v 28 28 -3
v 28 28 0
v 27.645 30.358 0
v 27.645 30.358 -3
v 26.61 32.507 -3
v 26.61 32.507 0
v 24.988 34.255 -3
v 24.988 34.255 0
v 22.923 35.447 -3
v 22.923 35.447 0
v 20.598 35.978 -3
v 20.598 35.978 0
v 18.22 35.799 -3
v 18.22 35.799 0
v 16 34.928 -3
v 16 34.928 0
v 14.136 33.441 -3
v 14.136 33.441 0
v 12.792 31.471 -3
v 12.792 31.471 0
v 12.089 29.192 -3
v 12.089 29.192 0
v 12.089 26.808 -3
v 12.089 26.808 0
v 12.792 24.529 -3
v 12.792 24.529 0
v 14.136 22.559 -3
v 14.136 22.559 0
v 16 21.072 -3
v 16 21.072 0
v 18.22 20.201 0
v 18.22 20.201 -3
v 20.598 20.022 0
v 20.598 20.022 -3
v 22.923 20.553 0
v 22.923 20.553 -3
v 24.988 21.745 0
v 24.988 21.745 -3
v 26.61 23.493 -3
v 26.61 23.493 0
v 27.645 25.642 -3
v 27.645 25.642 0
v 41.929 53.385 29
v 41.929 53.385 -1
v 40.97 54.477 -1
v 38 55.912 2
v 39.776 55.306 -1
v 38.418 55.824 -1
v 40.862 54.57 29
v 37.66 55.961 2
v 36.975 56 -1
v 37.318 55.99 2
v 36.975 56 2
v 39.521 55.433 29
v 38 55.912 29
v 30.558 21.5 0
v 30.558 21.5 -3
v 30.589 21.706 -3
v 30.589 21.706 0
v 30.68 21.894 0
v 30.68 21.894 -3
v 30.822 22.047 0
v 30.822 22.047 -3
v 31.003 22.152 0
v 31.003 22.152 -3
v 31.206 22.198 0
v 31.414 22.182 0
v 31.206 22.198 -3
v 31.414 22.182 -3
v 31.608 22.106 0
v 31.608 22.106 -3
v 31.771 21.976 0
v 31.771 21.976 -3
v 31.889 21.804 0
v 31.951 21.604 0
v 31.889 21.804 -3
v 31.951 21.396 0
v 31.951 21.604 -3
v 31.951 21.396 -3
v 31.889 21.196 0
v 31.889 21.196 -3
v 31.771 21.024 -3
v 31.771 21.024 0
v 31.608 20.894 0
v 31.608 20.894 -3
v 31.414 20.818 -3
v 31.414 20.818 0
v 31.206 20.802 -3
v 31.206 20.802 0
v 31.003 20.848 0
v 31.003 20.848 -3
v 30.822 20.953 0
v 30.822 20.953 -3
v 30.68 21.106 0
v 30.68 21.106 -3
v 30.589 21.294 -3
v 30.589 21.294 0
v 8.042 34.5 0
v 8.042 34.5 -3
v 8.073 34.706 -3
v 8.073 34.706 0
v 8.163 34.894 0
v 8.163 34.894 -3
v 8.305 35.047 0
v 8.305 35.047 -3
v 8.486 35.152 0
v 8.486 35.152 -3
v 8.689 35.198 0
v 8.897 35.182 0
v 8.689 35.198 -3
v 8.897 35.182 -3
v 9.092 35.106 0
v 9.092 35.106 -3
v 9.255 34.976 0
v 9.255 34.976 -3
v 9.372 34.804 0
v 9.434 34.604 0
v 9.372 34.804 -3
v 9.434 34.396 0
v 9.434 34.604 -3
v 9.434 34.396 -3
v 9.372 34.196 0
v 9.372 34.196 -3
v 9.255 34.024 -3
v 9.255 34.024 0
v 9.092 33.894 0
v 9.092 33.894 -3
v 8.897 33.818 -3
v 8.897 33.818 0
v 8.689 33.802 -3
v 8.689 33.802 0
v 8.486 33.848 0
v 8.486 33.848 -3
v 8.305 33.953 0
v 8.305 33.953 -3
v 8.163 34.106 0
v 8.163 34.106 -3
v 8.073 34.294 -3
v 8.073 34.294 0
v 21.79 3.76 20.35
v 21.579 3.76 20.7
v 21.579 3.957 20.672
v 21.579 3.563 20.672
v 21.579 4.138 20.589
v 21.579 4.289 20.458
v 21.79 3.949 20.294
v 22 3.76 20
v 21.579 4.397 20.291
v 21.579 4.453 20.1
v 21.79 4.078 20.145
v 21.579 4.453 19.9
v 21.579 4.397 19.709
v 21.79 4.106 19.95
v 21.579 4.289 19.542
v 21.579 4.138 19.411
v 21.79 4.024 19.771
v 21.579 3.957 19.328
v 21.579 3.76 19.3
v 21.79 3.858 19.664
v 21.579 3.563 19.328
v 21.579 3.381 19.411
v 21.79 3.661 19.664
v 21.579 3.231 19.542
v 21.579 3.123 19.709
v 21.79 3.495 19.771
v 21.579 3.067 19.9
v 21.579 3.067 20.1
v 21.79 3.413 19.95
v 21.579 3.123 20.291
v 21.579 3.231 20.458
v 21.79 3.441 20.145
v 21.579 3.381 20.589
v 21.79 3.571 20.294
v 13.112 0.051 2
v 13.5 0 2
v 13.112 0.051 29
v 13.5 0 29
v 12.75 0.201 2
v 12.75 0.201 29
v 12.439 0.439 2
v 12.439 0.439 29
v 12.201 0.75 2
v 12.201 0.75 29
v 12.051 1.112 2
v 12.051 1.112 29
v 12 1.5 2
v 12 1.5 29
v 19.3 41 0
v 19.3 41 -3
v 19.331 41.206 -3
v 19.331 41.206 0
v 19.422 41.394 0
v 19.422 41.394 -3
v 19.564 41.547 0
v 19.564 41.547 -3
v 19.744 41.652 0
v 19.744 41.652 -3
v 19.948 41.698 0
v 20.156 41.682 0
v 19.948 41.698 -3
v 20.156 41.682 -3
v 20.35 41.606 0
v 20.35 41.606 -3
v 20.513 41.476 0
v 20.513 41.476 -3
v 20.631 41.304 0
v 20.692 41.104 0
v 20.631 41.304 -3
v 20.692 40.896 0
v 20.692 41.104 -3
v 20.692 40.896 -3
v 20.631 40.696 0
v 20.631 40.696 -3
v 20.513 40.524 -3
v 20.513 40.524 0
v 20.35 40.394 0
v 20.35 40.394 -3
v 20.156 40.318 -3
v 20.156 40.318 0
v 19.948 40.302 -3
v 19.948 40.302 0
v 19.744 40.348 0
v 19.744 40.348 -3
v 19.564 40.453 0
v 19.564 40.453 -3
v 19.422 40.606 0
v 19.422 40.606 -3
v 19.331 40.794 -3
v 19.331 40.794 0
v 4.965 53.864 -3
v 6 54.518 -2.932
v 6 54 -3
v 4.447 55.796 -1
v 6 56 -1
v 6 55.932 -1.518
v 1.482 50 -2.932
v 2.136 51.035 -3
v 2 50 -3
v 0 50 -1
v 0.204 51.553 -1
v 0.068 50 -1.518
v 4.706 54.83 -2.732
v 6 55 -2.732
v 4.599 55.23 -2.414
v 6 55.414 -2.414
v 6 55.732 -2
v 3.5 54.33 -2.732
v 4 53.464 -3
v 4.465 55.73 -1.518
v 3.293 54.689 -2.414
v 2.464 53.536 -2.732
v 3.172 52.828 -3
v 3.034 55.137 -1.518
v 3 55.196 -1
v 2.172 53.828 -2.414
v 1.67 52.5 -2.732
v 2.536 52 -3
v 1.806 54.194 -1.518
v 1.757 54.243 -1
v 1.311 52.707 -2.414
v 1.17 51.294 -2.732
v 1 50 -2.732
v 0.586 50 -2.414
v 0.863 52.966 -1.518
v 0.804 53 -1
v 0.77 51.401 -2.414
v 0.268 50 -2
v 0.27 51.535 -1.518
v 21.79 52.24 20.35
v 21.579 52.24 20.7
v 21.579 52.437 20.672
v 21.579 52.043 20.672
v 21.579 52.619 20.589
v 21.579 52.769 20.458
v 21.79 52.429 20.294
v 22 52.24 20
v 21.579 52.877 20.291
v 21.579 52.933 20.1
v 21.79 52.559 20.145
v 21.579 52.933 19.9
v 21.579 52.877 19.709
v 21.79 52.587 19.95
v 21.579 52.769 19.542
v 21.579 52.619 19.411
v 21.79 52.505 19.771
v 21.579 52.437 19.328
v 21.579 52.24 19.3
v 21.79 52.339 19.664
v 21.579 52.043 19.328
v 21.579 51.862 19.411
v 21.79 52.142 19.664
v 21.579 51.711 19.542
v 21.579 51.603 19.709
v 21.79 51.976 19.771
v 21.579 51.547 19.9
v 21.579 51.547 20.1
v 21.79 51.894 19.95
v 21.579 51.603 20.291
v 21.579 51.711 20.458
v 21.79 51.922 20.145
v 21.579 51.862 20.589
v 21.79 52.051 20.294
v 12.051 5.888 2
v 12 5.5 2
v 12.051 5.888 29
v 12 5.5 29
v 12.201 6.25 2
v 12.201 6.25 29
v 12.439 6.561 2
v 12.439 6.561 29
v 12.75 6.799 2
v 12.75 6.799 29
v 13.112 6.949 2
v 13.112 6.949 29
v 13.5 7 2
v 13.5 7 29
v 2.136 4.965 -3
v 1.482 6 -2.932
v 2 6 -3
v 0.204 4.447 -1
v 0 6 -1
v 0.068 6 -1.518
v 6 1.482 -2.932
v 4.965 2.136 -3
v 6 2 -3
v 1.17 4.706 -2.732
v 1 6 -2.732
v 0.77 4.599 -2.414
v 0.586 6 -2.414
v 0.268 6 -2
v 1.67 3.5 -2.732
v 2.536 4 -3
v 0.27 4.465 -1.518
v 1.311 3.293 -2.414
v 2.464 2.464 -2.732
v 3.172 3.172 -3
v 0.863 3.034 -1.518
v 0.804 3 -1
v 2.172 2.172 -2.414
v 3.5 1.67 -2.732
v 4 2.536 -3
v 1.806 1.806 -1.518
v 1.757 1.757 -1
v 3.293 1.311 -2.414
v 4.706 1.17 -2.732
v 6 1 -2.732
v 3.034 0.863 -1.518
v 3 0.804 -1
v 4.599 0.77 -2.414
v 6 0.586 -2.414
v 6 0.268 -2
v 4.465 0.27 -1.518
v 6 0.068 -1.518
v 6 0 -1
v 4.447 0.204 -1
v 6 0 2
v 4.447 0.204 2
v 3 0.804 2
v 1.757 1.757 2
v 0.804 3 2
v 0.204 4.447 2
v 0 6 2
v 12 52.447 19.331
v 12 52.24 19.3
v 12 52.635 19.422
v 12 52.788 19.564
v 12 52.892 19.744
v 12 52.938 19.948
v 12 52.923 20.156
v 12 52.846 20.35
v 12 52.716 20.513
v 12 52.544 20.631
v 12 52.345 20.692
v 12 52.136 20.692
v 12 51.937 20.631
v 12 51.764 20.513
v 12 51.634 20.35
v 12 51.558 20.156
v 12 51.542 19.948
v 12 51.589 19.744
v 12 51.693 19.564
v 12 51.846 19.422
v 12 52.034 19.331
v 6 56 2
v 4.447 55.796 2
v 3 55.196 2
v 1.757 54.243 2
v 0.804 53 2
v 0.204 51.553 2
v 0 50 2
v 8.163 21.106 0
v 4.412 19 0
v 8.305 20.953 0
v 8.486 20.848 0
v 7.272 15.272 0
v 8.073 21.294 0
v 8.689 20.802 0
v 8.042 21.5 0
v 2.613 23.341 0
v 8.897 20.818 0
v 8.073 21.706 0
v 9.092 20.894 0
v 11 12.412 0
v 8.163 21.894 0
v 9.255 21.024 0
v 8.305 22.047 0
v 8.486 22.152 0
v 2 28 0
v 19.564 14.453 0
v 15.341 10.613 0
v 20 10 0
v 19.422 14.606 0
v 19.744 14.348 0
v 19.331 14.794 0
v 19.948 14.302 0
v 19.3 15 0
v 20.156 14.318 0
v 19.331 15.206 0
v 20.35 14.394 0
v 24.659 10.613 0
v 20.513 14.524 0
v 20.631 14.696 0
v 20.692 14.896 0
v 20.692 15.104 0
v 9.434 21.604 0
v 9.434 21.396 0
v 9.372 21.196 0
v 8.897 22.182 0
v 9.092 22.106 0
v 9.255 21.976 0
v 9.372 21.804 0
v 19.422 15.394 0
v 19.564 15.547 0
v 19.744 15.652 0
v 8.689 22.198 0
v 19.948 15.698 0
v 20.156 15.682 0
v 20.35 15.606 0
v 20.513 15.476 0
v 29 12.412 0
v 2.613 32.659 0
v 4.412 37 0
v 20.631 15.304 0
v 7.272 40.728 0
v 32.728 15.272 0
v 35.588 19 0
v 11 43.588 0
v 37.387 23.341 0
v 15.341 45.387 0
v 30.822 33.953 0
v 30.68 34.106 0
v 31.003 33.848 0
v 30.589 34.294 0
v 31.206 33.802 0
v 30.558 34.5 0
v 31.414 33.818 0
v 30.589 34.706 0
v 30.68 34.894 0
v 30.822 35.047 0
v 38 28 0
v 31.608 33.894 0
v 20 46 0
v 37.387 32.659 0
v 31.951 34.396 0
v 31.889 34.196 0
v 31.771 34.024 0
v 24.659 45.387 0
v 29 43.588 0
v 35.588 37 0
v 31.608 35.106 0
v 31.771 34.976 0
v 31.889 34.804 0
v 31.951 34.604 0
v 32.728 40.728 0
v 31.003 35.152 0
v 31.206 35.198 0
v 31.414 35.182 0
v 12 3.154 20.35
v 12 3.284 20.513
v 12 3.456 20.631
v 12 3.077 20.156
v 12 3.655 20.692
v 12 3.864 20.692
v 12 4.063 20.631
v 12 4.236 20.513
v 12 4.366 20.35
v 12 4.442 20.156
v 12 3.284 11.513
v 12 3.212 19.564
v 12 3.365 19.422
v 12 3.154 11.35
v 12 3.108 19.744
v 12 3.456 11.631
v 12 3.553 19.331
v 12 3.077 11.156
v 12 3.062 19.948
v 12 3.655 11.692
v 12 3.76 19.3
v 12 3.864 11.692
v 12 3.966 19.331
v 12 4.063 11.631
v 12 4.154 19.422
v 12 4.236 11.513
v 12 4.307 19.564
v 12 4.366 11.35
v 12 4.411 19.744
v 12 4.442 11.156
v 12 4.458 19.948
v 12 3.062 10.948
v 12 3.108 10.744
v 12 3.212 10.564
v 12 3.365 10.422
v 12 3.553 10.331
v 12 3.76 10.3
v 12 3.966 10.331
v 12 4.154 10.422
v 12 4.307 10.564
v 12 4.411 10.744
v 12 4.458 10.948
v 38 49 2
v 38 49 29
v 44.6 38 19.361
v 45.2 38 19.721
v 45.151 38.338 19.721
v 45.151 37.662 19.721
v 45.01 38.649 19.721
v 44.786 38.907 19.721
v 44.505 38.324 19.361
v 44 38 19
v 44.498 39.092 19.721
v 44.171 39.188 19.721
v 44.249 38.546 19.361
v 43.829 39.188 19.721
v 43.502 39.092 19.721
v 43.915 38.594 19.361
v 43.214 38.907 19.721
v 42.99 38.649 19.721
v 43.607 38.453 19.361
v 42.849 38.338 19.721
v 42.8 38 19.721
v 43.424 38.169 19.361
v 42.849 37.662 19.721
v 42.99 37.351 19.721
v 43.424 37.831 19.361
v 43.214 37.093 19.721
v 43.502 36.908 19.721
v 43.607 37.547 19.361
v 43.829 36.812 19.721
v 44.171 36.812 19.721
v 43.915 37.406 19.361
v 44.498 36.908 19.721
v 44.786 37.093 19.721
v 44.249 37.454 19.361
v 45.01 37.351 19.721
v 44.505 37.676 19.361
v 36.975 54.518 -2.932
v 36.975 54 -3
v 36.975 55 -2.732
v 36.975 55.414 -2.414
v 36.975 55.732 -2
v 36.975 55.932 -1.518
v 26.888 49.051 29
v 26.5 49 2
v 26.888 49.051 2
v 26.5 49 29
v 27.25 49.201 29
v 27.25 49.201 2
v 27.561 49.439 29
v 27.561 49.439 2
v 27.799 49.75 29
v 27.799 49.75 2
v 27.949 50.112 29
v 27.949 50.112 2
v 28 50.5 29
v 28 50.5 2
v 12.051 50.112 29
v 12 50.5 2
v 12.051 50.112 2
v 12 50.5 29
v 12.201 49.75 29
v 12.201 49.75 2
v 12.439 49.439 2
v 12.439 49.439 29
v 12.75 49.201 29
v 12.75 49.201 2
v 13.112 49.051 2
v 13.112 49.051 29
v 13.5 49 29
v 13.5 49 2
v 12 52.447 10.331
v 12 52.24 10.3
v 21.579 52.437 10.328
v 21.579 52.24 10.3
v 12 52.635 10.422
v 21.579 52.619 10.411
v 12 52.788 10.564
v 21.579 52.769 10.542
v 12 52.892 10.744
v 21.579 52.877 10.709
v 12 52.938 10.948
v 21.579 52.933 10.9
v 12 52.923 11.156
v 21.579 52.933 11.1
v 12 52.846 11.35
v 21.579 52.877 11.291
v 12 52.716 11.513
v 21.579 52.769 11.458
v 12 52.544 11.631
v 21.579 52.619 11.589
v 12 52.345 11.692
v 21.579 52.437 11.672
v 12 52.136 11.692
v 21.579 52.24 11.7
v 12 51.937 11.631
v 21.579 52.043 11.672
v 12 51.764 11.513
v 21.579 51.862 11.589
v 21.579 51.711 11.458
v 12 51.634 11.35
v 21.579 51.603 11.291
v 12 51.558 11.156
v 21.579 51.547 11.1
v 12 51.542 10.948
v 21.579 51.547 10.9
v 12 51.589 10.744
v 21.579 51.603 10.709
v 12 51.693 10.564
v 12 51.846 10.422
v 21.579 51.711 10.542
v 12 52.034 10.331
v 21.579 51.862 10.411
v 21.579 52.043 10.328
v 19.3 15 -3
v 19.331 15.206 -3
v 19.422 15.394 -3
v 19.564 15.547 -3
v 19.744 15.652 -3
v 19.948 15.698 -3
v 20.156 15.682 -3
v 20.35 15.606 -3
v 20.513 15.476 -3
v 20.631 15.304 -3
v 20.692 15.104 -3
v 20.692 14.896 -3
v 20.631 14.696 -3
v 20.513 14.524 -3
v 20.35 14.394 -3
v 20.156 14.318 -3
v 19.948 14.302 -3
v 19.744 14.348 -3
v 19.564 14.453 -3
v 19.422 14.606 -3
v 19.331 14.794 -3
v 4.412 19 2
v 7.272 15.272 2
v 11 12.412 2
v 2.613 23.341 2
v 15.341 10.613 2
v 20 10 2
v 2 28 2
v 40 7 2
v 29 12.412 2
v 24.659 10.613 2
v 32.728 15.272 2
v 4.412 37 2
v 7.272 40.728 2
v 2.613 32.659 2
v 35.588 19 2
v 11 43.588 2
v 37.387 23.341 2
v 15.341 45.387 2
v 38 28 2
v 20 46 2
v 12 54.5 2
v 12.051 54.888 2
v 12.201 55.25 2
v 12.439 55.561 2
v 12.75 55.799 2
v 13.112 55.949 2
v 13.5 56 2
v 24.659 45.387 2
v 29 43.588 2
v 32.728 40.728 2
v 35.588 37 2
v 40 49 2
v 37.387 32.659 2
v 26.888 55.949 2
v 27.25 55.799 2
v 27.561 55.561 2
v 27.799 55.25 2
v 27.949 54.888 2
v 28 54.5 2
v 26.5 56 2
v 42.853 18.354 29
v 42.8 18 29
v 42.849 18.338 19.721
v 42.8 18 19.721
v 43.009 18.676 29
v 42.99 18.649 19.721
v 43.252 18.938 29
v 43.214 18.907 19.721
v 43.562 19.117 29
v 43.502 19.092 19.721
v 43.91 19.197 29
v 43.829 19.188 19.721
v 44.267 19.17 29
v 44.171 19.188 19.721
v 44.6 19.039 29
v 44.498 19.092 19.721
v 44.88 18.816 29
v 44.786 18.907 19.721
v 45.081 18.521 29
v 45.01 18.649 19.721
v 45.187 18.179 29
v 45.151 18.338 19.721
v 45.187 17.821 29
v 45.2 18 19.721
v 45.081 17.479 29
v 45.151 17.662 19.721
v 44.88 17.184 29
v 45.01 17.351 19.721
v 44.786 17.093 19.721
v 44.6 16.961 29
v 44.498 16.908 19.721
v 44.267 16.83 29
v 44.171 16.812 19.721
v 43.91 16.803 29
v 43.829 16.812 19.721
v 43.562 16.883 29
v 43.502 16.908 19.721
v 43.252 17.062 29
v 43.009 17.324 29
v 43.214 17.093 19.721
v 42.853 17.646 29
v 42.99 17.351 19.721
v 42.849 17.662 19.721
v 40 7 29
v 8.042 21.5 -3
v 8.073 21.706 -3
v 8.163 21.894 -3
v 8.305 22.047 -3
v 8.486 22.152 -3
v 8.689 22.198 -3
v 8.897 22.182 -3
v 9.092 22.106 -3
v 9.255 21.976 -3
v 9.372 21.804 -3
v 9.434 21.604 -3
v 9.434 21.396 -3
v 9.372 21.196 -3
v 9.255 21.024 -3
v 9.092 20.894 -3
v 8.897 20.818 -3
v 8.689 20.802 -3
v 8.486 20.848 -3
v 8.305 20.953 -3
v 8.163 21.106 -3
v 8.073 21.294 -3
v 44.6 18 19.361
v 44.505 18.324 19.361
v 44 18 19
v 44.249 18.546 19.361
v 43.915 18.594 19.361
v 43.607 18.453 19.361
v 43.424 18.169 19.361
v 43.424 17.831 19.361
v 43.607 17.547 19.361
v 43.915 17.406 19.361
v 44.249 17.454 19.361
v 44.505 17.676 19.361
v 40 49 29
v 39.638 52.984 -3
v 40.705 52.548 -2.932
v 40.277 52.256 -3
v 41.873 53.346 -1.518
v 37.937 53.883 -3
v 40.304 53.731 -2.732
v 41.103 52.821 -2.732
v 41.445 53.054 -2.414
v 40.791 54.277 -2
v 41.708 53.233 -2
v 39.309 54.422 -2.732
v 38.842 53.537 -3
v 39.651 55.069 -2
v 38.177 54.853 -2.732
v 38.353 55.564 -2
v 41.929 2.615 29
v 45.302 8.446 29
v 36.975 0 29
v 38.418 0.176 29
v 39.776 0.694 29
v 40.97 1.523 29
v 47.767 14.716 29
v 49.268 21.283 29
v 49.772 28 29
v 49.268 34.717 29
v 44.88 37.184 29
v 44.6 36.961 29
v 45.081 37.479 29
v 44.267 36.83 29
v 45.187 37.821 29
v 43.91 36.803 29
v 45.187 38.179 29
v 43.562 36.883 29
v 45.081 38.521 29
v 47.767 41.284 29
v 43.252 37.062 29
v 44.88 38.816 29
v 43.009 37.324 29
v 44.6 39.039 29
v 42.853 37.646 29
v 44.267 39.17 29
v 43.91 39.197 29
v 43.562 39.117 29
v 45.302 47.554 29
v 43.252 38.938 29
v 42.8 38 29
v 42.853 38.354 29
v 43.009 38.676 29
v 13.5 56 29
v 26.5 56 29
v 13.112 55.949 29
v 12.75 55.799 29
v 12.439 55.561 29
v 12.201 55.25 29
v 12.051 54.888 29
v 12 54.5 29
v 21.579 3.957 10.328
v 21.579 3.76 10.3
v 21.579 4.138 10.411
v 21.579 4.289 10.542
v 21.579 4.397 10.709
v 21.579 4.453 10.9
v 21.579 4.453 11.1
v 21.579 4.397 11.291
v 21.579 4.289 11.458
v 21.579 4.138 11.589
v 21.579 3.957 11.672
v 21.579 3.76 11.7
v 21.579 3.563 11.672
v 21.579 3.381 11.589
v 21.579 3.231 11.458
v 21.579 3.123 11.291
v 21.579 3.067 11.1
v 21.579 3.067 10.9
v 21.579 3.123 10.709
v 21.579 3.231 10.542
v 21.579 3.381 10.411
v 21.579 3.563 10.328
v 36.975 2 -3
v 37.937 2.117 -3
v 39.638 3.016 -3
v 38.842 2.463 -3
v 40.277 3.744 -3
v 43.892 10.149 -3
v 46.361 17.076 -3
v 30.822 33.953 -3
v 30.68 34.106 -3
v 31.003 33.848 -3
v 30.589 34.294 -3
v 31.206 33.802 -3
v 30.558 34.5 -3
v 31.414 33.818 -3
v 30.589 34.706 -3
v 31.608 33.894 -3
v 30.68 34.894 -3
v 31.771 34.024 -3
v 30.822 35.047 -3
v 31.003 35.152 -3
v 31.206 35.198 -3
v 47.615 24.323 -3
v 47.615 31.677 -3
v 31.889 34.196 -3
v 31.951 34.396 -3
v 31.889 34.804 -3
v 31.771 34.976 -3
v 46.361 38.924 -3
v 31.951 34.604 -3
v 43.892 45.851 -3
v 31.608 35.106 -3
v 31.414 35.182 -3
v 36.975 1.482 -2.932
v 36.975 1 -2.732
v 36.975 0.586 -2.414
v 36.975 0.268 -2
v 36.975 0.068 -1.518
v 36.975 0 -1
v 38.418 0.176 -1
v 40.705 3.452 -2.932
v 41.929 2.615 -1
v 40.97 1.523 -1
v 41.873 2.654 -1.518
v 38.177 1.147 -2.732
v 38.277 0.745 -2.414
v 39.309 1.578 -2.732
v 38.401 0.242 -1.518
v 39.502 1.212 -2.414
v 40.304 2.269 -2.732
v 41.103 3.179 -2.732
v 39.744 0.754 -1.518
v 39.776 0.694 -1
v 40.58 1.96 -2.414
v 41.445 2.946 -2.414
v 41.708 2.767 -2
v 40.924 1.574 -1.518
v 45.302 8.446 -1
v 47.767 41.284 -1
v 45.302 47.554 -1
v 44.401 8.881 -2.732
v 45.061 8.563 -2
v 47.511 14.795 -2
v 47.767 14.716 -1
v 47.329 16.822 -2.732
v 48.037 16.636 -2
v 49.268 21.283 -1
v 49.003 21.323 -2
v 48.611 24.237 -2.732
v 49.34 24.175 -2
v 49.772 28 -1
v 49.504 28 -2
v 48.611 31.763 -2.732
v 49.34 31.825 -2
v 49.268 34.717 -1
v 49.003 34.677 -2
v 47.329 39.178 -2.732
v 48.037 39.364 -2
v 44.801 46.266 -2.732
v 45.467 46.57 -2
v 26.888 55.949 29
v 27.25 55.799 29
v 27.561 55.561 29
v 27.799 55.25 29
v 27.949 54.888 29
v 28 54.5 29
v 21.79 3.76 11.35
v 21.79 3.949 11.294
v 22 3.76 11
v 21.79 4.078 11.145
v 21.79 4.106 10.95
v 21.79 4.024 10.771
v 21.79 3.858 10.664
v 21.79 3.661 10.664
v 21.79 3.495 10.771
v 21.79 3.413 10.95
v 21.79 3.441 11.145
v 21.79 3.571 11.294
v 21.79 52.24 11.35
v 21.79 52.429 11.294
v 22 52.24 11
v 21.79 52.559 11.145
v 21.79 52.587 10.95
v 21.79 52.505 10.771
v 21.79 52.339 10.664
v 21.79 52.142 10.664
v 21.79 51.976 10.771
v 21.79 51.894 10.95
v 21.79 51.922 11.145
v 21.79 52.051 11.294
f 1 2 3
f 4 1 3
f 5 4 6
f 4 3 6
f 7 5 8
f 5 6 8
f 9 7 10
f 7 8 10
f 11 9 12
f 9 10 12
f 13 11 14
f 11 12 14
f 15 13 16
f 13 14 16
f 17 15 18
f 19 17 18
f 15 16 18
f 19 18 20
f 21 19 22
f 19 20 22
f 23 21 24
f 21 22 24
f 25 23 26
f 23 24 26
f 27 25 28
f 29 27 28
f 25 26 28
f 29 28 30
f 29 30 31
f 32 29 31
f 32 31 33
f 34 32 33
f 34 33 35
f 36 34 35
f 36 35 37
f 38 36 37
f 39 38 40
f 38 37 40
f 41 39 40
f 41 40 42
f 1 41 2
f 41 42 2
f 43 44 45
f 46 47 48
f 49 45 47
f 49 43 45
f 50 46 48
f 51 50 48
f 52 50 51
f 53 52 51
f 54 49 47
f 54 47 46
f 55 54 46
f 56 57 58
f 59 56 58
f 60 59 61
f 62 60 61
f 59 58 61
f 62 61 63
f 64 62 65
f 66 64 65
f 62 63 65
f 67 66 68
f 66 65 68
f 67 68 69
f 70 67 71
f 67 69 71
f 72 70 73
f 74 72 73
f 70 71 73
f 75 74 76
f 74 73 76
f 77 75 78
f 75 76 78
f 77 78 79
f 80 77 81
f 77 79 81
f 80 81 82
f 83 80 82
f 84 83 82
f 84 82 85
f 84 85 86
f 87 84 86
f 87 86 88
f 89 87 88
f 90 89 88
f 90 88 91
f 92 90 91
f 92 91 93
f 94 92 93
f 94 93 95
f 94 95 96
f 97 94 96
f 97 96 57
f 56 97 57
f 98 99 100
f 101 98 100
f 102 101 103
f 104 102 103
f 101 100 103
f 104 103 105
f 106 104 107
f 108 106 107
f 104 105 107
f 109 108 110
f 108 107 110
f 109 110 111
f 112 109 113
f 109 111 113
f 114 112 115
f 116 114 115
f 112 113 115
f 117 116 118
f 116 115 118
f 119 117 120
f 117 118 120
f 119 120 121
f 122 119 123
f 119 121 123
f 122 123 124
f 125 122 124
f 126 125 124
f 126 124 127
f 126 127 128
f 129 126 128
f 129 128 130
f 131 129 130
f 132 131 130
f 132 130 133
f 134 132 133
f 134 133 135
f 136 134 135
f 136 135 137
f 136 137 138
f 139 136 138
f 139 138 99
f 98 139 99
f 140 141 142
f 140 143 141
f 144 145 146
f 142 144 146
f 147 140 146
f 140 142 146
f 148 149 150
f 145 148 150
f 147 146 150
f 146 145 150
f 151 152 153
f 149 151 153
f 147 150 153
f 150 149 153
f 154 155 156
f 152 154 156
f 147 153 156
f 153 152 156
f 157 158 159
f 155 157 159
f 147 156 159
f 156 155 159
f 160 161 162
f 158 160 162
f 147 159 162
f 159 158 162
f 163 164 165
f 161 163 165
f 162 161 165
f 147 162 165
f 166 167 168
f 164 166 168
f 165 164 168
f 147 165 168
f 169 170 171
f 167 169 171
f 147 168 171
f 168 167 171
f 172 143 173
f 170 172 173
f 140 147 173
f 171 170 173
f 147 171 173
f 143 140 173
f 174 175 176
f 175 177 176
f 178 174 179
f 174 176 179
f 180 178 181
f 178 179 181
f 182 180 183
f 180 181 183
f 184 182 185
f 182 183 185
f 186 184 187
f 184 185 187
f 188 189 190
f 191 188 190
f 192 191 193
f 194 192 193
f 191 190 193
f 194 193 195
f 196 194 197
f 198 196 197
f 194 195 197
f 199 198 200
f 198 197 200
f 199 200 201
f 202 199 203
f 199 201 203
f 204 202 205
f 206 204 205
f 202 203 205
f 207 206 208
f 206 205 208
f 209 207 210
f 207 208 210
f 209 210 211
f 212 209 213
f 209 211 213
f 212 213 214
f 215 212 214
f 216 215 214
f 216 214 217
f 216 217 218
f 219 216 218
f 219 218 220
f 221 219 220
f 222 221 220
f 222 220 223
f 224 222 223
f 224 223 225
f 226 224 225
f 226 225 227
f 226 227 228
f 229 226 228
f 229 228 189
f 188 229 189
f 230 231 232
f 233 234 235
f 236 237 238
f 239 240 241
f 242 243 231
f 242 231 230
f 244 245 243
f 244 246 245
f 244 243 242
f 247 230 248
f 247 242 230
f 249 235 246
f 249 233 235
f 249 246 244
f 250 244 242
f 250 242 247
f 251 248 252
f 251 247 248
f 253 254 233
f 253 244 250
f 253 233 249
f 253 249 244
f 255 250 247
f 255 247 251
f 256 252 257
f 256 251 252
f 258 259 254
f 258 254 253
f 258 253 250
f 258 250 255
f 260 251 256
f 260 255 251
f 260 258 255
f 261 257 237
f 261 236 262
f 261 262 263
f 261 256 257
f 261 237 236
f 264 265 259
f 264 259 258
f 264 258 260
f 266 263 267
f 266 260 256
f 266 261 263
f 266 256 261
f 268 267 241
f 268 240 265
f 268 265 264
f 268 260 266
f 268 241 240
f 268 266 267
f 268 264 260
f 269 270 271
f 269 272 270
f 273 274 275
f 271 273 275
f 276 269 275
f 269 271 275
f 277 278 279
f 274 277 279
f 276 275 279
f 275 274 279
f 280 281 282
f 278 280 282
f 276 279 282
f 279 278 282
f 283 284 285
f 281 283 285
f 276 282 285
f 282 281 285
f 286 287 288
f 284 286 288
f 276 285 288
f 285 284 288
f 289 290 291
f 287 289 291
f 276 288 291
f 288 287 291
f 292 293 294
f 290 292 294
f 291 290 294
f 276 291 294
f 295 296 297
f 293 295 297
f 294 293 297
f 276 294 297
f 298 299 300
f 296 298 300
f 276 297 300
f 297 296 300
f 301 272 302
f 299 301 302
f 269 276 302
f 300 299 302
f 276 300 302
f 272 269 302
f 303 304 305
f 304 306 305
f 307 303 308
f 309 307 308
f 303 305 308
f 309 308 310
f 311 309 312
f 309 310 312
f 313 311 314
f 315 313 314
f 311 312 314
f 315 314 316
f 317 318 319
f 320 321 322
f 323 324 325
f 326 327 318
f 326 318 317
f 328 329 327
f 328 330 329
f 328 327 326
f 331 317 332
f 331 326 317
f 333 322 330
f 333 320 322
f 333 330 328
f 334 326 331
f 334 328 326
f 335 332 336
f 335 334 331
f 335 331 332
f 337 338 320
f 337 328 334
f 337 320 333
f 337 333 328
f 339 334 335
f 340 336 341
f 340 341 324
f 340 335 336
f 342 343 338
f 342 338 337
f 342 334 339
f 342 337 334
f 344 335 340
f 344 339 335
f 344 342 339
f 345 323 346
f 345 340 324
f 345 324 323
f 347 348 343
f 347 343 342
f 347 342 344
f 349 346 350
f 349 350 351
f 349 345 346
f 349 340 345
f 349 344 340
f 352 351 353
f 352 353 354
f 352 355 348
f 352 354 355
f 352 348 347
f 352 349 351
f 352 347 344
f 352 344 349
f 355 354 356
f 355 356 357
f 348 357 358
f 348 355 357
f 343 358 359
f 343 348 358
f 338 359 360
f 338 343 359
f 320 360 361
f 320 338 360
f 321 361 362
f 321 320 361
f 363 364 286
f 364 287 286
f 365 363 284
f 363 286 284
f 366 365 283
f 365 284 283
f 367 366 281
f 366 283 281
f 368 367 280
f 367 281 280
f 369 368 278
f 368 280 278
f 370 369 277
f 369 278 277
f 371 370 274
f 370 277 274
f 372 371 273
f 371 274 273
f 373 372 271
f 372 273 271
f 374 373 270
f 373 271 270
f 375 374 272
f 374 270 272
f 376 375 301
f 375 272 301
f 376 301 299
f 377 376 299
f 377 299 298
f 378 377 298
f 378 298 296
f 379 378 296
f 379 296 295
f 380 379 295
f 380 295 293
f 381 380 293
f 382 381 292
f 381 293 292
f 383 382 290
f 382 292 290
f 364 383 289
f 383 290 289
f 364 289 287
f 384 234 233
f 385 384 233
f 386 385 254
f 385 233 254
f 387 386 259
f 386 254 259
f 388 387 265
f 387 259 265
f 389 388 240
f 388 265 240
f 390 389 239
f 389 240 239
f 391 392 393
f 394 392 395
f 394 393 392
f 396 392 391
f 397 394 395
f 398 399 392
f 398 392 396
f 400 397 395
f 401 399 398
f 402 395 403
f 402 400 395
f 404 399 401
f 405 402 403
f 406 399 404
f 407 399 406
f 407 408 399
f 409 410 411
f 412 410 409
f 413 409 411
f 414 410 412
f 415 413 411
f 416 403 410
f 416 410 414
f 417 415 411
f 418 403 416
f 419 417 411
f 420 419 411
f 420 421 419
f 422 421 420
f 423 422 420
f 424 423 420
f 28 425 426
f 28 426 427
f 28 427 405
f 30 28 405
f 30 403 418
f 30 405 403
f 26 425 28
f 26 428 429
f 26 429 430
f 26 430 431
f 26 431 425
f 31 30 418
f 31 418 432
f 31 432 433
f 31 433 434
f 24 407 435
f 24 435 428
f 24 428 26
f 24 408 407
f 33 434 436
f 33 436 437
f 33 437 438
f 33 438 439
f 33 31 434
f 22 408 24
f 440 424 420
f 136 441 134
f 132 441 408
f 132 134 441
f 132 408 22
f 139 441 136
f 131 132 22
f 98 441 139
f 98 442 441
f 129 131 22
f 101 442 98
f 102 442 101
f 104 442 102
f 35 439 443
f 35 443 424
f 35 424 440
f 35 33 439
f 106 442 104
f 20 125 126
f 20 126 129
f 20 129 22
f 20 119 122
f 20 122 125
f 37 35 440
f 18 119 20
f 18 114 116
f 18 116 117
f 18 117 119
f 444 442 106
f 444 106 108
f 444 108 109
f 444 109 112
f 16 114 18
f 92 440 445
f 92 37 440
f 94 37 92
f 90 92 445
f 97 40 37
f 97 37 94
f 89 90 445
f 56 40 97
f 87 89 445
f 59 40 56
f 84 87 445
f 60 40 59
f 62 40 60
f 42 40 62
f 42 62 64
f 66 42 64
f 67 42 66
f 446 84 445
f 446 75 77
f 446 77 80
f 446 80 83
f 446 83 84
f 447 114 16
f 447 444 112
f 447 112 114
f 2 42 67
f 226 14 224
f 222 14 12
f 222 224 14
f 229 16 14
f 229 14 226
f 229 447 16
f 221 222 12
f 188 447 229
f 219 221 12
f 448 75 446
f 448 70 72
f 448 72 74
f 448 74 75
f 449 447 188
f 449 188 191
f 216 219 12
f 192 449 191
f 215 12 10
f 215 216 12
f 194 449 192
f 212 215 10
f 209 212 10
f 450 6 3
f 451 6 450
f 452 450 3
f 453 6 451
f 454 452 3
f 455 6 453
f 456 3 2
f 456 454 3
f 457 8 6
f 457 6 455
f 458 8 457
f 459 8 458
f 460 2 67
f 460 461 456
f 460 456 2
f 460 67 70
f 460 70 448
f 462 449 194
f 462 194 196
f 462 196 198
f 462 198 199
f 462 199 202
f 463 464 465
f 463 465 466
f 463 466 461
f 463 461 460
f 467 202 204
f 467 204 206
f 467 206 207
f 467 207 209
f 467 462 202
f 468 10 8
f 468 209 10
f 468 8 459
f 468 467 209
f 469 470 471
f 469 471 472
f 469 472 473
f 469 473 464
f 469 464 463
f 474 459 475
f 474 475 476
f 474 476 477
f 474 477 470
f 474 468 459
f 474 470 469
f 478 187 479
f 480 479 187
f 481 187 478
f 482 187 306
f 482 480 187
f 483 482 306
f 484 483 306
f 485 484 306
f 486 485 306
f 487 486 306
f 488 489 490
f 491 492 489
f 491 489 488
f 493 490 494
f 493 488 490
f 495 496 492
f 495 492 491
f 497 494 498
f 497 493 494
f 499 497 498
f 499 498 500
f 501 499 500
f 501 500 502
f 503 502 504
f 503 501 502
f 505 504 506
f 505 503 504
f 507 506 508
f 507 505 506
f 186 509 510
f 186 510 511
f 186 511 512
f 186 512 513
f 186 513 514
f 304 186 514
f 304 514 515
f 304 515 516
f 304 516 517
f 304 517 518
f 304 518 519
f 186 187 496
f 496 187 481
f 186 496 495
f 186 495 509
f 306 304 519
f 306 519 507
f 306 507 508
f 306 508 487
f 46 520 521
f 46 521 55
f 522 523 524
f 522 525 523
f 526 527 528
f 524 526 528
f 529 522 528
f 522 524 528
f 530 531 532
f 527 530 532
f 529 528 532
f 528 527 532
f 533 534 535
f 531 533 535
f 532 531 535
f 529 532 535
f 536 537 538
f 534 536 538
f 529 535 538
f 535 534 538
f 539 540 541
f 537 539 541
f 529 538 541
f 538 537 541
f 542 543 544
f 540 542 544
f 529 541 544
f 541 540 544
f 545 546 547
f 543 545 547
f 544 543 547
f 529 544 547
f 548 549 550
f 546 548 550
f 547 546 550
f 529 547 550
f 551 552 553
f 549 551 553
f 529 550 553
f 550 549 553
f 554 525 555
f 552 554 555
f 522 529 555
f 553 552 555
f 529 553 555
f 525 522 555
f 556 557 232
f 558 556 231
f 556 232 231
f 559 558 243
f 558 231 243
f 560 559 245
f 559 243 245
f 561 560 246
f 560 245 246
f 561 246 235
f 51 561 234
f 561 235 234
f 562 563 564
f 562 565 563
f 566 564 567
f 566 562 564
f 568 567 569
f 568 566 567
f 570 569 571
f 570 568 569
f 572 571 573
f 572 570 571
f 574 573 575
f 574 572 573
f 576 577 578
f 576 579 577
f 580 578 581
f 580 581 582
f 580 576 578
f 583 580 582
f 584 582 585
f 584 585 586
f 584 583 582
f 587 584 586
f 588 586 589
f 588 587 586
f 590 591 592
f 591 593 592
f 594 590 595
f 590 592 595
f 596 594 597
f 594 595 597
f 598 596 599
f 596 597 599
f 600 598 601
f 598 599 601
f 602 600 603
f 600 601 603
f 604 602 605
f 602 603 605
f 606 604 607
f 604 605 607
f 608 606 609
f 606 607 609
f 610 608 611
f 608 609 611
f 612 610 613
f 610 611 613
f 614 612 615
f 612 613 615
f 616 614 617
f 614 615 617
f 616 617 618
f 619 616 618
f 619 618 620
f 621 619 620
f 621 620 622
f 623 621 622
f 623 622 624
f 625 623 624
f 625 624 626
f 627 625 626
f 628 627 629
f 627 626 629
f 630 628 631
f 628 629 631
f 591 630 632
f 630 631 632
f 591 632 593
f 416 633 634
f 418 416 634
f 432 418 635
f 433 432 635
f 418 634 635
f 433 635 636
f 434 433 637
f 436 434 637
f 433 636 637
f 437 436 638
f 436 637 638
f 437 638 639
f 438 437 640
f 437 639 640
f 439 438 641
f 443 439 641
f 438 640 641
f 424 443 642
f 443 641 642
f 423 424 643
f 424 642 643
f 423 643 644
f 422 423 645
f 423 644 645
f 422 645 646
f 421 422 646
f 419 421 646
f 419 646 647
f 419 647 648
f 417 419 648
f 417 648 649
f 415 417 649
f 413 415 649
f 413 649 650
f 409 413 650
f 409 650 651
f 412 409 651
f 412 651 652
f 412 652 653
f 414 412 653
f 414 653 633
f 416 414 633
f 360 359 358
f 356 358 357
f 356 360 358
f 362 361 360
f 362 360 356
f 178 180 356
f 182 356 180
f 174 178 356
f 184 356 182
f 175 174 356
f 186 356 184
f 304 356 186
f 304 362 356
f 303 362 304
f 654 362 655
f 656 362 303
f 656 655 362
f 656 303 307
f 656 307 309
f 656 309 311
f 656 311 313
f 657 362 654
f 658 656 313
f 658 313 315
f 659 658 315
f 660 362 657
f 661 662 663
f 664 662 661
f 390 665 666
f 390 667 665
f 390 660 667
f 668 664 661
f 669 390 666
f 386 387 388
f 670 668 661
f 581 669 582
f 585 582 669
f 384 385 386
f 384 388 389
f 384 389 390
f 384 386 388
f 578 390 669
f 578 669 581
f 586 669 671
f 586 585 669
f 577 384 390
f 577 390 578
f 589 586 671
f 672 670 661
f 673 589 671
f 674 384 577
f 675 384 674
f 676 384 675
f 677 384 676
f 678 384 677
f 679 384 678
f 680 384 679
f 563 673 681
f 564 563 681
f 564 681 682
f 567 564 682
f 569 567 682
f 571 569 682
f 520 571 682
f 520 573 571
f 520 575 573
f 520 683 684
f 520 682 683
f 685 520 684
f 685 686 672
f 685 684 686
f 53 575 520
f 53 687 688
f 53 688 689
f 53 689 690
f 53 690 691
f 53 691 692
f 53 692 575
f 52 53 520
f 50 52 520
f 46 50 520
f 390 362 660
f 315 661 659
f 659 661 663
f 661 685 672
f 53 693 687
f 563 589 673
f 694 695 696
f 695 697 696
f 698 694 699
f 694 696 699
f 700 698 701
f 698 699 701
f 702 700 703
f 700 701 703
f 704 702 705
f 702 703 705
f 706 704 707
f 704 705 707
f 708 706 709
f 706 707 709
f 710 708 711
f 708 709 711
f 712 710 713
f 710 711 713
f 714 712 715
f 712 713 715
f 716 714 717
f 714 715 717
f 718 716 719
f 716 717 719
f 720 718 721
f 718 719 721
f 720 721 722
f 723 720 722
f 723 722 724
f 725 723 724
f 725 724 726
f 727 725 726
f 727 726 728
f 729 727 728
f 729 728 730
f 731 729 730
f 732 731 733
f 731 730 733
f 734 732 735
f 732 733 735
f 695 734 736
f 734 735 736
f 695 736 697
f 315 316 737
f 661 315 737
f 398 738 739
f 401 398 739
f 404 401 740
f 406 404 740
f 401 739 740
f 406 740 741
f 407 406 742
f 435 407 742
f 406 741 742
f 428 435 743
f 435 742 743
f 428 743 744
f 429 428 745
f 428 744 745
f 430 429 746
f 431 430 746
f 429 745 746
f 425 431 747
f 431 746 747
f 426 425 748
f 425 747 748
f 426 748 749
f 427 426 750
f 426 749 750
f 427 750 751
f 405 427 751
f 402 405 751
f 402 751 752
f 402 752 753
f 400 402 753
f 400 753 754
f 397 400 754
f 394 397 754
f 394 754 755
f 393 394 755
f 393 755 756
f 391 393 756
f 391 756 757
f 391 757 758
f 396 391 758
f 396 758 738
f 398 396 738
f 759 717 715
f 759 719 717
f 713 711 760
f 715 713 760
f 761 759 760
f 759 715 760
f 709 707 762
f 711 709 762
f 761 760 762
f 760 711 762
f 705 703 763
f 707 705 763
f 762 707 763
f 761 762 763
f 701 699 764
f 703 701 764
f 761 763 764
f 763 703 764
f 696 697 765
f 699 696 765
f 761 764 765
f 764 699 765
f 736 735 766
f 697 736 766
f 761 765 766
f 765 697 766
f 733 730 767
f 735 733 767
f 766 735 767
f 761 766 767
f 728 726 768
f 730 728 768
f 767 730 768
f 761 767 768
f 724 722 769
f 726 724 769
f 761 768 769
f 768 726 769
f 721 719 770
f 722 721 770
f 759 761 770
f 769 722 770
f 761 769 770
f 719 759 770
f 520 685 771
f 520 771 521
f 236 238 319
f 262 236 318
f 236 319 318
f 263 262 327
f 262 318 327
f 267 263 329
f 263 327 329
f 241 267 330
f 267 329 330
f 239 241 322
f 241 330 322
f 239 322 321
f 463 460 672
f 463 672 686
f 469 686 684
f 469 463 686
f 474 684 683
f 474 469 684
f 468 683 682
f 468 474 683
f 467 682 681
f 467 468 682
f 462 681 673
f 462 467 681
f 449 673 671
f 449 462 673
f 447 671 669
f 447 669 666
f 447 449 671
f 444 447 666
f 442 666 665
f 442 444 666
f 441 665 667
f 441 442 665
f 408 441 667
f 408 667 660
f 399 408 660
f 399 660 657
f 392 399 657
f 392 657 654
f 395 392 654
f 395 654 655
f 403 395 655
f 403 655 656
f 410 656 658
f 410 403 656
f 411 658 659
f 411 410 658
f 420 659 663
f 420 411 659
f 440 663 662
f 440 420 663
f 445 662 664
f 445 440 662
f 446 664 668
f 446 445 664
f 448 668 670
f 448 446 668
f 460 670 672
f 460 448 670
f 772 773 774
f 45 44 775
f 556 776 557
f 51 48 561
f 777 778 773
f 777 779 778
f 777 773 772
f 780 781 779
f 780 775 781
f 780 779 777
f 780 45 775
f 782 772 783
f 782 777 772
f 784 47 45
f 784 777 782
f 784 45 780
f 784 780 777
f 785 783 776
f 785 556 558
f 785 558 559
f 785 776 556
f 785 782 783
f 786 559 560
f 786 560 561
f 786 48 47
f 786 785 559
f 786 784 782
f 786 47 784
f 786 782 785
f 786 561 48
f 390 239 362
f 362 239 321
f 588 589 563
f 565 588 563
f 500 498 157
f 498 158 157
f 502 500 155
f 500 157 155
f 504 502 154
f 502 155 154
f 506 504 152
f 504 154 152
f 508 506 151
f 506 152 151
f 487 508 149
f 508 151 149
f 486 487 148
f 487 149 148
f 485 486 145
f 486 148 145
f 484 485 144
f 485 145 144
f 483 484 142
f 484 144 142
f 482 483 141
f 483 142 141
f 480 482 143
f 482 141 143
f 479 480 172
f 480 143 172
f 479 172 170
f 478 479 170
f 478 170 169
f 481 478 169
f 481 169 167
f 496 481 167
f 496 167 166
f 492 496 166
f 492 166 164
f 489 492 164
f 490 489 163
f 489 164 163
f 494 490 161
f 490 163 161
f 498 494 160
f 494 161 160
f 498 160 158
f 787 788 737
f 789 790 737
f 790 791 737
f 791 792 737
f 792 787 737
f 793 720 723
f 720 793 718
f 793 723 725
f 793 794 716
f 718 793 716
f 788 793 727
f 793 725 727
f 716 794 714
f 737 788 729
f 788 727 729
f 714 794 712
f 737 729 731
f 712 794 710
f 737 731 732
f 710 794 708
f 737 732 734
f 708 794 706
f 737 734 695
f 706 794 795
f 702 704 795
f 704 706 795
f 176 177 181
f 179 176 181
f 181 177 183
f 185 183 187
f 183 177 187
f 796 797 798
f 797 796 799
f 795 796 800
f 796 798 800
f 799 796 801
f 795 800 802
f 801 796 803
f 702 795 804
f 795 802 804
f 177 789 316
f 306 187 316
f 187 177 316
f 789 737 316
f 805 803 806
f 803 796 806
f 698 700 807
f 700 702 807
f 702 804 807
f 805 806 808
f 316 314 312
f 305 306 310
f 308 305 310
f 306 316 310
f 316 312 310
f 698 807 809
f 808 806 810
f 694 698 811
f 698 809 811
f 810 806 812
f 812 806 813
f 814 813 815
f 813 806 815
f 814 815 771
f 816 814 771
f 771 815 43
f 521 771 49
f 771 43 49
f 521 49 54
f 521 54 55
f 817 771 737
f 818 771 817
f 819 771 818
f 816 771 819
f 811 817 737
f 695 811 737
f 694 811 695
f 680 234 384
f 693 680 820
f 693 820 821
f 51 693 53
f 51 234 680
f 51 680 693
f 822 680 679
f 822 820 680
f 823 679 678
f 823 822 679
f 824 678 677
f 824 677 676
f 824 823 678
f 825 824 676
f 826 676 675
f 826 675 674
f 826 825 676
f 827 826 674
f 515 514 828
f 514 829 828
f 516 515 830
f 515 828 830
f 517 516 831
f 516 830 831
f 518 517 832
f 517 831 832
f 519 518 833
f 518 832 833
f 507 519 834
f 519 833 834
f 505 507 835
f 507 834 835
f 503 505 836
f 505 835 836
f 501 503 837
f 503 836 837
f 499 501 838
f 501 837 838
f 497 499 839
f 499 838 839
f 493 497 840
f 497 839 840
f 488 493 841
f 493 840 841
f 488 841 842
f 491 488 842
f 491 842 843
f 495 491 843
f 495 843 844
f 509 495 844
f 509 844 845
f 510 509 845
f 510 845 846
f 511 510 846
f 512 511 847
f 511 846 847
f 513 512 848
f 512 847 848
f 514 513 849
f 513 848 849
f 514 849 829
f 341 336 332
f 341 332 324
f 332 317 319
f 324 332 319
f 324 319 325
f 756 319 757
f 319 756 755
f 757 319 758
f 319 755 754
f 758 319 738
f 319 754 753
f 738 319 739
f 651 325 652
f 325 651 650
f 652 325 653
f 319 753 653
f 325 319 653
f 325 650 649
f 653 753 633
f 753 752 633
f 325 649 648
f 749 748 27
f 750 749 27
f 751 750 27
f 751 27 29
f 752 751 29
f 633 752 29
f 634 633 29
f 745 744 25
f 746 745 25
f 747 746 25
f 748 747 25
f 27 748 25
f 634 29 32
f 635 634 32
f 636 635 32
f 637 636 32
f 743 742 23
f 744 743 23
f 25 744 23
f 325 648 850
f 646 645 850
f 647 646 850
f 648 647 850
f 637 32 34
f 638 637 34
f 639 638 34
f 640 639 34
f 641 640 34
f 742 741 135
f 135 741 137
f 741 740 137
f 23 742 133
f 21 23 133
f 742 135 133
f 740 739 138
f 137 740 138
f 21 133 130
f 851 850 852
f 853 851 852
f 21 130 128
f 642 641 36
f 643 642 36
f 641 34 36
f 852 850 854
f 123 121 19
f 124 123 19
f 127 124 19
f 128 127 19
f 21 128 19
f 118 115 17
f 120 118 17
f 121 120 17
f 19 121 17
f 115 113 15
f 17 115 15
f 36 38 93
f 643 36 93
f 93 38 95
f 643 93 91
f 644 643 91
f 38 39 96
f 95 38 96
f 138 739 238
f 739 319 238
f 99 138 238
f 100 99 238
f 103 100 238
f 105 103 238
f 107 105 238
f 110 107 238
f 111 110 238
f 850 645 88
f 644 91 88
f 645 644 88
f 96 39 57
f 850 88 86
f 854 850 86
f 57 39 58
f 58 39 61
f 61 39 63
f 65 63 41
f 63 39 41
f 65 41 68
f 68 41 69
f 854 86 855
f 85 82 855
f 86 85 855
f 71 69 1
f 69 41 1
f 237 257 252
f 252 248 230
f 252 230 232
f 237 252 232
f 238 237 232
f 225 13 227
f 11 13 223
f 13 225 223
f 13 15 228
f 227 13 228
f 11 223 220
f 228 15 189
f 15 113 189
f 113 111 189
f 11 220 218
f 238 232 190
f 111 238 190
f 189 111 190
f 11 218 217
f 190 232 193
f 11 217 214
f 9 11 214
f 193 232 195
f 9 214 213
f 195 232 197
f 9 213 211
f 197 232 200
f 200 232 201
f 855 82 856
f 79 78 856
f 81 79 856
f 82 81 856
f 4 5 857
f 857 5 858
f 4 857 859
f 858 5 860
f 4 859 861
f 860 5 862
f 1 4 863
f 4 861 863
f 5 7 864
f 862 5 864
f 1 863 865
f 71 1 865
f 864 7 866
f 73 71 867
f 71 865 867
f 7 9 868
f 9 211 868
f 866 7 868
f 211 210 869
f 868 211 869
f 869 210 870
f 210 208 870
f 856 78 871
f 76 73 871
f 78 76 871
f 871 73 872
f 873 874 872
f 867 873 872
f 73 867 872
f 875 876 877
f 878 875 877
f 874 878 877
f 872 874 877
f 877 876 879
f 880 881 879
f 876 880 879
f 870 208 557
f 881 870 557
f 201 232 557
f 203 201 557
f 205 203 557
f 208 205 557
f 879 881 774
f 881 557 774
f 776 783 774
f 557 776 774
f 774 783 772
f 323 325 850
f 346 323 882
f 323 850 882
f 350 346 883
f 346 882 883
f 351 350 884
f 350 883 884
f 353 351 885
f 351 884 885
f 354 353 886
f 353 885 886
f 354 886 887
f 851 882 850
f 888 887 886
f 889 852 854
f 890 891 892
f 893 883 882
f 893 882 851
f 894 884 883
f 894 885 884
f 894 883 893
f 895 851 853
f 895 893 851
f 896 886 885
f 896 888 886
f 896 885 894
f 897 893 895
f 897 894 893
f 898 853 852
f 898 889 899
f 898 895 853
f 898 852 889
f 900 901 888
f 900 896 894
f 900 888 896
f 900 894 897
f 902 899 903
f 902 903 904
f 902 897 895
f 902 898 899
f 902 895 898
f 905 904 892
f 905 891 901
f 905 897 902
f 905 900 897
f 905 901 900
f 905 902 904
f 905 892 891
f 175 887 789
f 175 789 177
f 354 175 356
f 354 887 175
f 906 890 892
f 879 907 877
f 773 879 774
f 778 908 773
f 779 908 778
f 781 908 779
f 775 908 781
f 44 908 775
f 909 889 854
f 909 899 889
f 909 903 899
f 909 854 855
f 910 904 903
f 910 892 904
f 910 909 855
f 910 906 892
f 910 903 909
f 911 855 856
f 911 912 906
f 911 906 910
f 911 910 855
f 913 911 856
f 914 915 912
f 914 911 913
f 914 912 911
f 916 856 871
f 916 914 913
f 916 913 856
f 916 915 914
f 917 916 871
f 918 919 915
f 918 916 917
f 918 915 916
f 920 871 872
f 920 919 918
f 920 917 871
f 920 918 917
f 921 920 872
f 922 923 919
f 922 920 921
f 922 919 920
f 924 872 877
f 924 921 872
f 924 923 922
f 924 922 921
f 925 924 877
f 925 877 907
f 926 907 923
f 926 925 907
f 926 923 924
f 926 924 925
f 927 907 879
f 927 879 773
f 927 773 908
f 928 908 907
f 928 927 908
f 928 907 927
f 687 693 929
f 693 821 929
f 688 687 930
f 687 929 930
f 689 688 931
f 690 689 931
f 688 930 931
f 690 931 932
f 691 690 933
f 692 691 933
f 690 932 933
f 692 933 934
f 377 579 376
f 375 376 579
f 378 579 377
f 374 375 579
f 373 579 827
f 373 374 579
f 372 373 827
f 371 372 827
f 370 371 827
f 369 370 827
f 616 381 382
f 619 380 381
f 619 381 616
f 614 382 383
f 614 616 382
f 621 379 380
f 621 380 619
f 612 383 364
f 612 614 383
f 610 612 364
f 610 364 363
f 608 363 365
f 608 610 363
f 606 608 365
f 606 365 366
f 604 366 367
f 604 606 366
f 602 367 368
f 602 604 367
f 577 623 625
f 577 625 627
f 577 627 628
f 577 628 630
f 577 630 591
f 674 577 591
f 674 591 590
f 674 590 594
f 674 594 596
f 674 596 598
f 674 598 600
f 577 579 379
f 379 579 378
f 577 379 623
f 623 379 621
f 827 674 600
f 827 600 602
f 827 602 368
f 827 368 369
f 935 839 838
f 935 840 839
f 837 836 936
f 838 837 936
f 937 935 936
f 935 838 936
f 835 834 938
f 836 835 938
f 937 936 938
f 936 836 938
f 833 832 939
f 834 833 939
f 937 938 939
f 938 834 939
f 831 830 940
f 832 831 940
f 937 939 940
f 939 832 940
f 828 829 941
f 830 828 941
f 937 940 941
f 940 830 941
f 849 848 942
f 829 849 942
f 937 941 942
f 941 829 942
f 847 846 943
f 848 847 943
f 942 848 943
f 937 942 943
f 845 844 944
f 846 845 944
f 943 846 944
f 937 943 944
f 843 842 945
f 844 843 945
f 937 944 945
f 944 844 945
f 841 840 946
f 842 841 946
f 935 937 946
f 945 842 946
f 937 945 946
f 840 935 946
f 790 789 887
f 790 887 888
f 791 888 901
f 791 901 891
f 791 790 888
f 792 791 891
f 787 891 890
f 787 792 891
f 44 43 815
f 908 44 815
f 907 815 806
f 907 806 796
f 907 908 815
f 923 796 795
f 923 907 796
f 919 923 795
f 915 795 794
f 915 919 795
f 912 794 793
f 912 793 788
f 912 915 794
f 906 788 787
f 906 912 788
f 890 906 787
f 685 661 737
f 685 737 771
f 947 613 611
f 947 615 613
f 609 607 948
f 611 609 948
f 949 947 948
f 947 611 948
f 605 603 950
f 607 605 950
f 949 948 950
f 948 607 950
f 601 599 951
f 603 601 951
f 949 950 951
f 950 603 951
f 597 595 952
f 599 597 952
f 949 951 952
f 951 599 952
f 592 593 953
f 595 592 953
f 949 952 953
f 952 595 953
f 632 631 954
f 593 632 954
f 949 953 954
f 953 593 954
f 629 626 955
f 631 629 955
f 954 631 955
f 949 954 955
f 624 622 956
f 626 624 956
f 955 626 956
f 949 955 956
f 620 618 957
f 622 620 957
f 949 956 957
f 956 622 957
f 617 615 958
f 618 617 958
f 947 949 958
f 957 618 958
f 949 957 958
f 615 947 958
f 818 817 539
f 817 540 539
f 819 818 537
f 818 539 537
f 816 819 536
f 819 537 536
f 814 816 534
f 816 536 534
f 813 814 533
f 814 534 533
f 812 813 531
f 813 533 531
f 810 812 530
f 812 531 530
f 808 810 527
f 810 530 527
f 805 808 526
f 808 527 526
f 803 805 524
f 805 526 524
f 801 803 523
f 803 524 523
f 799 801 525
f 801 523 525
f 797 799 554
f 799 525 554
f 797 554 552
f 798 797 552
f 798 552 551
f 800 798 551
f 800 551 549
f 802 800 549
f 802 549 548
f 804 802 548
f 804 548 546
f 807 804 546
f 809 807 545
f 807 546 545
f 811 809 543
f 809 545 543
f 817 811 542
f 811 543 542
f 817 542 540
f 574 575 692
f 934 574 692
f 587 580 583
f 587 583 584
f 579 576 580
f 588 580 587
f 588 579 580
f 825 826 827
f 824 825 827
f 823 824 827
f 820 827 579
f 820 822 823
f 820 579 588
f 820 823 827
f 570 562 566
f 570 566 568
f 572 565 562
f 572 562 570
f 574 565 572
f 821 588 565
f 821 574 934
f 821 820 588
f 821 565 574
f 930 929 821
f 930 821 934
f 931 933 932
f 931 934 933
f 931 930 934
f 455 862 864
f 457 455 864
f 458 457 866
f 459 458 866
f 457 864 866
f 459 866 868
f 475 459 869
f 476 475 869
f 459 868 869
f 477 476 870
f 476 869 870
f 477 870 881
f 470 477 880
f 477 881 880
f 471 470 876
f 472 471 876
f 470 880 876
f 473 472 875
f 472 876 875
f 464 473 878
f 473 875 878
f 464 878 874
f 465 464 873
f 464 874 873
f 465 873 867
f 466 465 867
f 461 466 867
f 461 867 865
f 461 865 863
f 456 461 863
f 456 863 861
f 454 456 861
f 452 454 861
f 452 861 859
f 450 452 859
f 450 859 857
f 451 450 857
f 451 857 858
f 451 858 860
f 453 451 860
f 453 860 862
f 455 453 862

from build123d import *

# Parameters (mm, degrees)
SKETCH_1_R              = 8
EXTRUDE_1_DEPTH         = 3
HOLE_WIZARD_M1_21_D     = 1.4
HOLE_WIZARD_M1_21_DEPTH = 9.579397567
HOLE_WIZARD_M1_21_TIP   = 0.420602433
EXTRUDE_START           = 2
SKETCH_1_3_R            = 18
EXTRUDE_2_DEPTH         = 2
EXTRUDE_START_2         = 27
SKETCH_2_W              = 16
SKETCH_2_H              = 7
EXTRUDE_3_DEPTH         = 27
FILLET_1_R              = 6
FILLET_3_R              = 1.5
HOLE_WIZARD_M21_D       = 2.4
HOLE_WIZARD_M21_DEPTH   = 9.278967257
HOLE_WIZARD_M21_TIP     = 0.721032743
HOLE_WIZARD_M1_22_D     = 1.4
HOLE_WIZARD_M1_22_DEPTH = 9.579397567
HOLE_WIZARD_M1_22_TIP   = 0.420602433
FILLET_4_R              = 2


with BuildPart() as part:
    # Эскиз1 → Бобышка-Вытянуть1 (new body)
    with BuildSketch(Plane.XY):
        with BuildLine():
            Line((0, 56), (0, 0))
            Line((0, 0), (40, 0))
            ThreePointArc((40, 0), (49.772170092, 28), (40, 56))
            Line((40, 56), (0, 56))
        make_face()
        with Locations((20, 28)):
            Circle(SKETCH_1_R, mode=Mode.SUBTRACT)
    extrude(amount=-EXTRUDE_1_DEPTH)

    # Отверстие с зазором M1.21
    with Locations(Plane.XY):
        with Locations((20, 41), (31.258330249, 34.5), (31.258330249, 21.5), (20, 15), (8.741669751, 21.5), (8.741669751, 34.5)):
            Hole(HOLE_WIZARD_M1_21_D / 2, depth=HOLE_WIZARD_M1_21_DEPTH)
            with Locations((0, 0, -(HOLE_WIZARD_M1_21_DEPTH + HOLE_WIZARD_M1_21_TIP / 2))):  # 118° drill point
                Cone(0, HOLE_WIZARD_M1_21_D / 2, HOLE_WIZARD_M1_21_TIP, mode=Mode.SUBTRACT)

    # Эскиз1<3> → Бобышка-Вытянуть2 (add)
    with BuildSketch(Plane.XY.offset(EXTRUDE_START)):
        with BuildLine():
            Line((0, 56), (0, 0))
            Line((0, 0), (40, 0))
            ThreePointArc((40, 0), (49.772170092, 28), (40, 56))
            Line((40, 56), (0, 56))
        make_face()
        with Locations((20, 28)):
            Circle(SKETCH_1_3_R, mode=Mode.SUBTRACT)
    extrude(amount=-EXTRUDE_2_DEPTH)

    # Эскиз2 → Бобышка-Вытянуть3 (add)
    with BuildSketch(Plane.XY.offset(2).offset(EXTRUDE_START_2)):
        with BuildLine():
            Line((40, 0), (12, 0))
            Line((12, 0), (12, 7))
            Line((12, 7), (40, 7))
            Line((40, 7), (40, 49))
            Line((40, 49), (38, 49))
            Line((38, 49), (38, 56))
            Line((38, 56), (40, 56))
            ThreePointArc((40, 56), (49.772170092, 28), (40, 0))
        make_face()
        with Locations((20, 52.5)):
            Rectangle(SKETCH_2_W, SKETCH_2_H)
    extrude(amount=-EXTRUDE_3_DEPTH)

    # Скругление1
    fillet_1_edges = [part.edges().sort_by_distance(p)[0] for p in [
        (40, 56, 13),
        (40, 0, 13),
        (0, 0, -0.5),
        (0, 56, -0.5),
    ]]
    fillet(fillet_1_edges, radius=FILLET_1_R)

    # Скругление3
    fillet_3_edges = [part.edges().sort_by_distance(p)[0] for p in [
        (12, 0, 15.5),
        (12, 7, 15.5),
        (28, 56, 15.5),
        (28, 49, 15.5),
        (12, 56, 15.5),
        (12, 49, 15.5),
    ]]
    fillet(fillet_3_edges, radius=FILLET_3_R)

    # Отверстие с зазором M21
    with Locations(Plane.XY.offset(29)):
        with Locations((44, 38), (44, 18)):
            Hole(HOLE_WIZARD_M21_D / 2, depth=HOLE_WIZARD_M21_DEPTH)
            with Locations((0, 0, -(HOLE_WIZARD_M21_DEPTH + HOLE_WIZARD_M21_TIP / 2))):  # 118° drill point
                Cone(0, HOLE_WIZARD_M21_D / 2, HOLE_WIZARD_M21_TIP, mode=Mode.SUBTRACT)

    # Отверстие с зазором M1.22
    with Locations(Plane.ZY.offset(-12)):
        with Locations((20, 52.240238149), (11, 52.240238149), (20, 3.759761857), (11, 3.759761857)):
            Hole(HOLE_WIZARD_M1_22_D / 2, depth=HOLE_WIZARD_M1_22_DEPTH)
            with Locations((0, 0, -(HOLE_WIZARD_M1_22_DEPTH + HOLE_WIZARD_M1_22_TIP / 2))):  # 118° drill point
                Cone(0, HOLE_WIZARD_M1_22_D / 2, HOLE_WIZARD_M1_22_TIP, mode=Mode.SUBTRACT)

    # Скругление4
    fillet_4_edges = [part.edges().sort_by_distance(p)[0] for p in [
        (39.775753154, 0.693980197, -3),
        (21.487327234, 0, -3),
        (1.757359313, 1.757359313, -3),
        (0, 28, -3),
        (1.757359313, 54.242640687, -3),
        (21.487327234, 56, -3),
        (39.775753154, 55.306019803, -3),
        (49.772170092, 28, -3),
    ]]
    fillet(fillet_4_edges, radius=FILLET_4_R)


solid = part.part
